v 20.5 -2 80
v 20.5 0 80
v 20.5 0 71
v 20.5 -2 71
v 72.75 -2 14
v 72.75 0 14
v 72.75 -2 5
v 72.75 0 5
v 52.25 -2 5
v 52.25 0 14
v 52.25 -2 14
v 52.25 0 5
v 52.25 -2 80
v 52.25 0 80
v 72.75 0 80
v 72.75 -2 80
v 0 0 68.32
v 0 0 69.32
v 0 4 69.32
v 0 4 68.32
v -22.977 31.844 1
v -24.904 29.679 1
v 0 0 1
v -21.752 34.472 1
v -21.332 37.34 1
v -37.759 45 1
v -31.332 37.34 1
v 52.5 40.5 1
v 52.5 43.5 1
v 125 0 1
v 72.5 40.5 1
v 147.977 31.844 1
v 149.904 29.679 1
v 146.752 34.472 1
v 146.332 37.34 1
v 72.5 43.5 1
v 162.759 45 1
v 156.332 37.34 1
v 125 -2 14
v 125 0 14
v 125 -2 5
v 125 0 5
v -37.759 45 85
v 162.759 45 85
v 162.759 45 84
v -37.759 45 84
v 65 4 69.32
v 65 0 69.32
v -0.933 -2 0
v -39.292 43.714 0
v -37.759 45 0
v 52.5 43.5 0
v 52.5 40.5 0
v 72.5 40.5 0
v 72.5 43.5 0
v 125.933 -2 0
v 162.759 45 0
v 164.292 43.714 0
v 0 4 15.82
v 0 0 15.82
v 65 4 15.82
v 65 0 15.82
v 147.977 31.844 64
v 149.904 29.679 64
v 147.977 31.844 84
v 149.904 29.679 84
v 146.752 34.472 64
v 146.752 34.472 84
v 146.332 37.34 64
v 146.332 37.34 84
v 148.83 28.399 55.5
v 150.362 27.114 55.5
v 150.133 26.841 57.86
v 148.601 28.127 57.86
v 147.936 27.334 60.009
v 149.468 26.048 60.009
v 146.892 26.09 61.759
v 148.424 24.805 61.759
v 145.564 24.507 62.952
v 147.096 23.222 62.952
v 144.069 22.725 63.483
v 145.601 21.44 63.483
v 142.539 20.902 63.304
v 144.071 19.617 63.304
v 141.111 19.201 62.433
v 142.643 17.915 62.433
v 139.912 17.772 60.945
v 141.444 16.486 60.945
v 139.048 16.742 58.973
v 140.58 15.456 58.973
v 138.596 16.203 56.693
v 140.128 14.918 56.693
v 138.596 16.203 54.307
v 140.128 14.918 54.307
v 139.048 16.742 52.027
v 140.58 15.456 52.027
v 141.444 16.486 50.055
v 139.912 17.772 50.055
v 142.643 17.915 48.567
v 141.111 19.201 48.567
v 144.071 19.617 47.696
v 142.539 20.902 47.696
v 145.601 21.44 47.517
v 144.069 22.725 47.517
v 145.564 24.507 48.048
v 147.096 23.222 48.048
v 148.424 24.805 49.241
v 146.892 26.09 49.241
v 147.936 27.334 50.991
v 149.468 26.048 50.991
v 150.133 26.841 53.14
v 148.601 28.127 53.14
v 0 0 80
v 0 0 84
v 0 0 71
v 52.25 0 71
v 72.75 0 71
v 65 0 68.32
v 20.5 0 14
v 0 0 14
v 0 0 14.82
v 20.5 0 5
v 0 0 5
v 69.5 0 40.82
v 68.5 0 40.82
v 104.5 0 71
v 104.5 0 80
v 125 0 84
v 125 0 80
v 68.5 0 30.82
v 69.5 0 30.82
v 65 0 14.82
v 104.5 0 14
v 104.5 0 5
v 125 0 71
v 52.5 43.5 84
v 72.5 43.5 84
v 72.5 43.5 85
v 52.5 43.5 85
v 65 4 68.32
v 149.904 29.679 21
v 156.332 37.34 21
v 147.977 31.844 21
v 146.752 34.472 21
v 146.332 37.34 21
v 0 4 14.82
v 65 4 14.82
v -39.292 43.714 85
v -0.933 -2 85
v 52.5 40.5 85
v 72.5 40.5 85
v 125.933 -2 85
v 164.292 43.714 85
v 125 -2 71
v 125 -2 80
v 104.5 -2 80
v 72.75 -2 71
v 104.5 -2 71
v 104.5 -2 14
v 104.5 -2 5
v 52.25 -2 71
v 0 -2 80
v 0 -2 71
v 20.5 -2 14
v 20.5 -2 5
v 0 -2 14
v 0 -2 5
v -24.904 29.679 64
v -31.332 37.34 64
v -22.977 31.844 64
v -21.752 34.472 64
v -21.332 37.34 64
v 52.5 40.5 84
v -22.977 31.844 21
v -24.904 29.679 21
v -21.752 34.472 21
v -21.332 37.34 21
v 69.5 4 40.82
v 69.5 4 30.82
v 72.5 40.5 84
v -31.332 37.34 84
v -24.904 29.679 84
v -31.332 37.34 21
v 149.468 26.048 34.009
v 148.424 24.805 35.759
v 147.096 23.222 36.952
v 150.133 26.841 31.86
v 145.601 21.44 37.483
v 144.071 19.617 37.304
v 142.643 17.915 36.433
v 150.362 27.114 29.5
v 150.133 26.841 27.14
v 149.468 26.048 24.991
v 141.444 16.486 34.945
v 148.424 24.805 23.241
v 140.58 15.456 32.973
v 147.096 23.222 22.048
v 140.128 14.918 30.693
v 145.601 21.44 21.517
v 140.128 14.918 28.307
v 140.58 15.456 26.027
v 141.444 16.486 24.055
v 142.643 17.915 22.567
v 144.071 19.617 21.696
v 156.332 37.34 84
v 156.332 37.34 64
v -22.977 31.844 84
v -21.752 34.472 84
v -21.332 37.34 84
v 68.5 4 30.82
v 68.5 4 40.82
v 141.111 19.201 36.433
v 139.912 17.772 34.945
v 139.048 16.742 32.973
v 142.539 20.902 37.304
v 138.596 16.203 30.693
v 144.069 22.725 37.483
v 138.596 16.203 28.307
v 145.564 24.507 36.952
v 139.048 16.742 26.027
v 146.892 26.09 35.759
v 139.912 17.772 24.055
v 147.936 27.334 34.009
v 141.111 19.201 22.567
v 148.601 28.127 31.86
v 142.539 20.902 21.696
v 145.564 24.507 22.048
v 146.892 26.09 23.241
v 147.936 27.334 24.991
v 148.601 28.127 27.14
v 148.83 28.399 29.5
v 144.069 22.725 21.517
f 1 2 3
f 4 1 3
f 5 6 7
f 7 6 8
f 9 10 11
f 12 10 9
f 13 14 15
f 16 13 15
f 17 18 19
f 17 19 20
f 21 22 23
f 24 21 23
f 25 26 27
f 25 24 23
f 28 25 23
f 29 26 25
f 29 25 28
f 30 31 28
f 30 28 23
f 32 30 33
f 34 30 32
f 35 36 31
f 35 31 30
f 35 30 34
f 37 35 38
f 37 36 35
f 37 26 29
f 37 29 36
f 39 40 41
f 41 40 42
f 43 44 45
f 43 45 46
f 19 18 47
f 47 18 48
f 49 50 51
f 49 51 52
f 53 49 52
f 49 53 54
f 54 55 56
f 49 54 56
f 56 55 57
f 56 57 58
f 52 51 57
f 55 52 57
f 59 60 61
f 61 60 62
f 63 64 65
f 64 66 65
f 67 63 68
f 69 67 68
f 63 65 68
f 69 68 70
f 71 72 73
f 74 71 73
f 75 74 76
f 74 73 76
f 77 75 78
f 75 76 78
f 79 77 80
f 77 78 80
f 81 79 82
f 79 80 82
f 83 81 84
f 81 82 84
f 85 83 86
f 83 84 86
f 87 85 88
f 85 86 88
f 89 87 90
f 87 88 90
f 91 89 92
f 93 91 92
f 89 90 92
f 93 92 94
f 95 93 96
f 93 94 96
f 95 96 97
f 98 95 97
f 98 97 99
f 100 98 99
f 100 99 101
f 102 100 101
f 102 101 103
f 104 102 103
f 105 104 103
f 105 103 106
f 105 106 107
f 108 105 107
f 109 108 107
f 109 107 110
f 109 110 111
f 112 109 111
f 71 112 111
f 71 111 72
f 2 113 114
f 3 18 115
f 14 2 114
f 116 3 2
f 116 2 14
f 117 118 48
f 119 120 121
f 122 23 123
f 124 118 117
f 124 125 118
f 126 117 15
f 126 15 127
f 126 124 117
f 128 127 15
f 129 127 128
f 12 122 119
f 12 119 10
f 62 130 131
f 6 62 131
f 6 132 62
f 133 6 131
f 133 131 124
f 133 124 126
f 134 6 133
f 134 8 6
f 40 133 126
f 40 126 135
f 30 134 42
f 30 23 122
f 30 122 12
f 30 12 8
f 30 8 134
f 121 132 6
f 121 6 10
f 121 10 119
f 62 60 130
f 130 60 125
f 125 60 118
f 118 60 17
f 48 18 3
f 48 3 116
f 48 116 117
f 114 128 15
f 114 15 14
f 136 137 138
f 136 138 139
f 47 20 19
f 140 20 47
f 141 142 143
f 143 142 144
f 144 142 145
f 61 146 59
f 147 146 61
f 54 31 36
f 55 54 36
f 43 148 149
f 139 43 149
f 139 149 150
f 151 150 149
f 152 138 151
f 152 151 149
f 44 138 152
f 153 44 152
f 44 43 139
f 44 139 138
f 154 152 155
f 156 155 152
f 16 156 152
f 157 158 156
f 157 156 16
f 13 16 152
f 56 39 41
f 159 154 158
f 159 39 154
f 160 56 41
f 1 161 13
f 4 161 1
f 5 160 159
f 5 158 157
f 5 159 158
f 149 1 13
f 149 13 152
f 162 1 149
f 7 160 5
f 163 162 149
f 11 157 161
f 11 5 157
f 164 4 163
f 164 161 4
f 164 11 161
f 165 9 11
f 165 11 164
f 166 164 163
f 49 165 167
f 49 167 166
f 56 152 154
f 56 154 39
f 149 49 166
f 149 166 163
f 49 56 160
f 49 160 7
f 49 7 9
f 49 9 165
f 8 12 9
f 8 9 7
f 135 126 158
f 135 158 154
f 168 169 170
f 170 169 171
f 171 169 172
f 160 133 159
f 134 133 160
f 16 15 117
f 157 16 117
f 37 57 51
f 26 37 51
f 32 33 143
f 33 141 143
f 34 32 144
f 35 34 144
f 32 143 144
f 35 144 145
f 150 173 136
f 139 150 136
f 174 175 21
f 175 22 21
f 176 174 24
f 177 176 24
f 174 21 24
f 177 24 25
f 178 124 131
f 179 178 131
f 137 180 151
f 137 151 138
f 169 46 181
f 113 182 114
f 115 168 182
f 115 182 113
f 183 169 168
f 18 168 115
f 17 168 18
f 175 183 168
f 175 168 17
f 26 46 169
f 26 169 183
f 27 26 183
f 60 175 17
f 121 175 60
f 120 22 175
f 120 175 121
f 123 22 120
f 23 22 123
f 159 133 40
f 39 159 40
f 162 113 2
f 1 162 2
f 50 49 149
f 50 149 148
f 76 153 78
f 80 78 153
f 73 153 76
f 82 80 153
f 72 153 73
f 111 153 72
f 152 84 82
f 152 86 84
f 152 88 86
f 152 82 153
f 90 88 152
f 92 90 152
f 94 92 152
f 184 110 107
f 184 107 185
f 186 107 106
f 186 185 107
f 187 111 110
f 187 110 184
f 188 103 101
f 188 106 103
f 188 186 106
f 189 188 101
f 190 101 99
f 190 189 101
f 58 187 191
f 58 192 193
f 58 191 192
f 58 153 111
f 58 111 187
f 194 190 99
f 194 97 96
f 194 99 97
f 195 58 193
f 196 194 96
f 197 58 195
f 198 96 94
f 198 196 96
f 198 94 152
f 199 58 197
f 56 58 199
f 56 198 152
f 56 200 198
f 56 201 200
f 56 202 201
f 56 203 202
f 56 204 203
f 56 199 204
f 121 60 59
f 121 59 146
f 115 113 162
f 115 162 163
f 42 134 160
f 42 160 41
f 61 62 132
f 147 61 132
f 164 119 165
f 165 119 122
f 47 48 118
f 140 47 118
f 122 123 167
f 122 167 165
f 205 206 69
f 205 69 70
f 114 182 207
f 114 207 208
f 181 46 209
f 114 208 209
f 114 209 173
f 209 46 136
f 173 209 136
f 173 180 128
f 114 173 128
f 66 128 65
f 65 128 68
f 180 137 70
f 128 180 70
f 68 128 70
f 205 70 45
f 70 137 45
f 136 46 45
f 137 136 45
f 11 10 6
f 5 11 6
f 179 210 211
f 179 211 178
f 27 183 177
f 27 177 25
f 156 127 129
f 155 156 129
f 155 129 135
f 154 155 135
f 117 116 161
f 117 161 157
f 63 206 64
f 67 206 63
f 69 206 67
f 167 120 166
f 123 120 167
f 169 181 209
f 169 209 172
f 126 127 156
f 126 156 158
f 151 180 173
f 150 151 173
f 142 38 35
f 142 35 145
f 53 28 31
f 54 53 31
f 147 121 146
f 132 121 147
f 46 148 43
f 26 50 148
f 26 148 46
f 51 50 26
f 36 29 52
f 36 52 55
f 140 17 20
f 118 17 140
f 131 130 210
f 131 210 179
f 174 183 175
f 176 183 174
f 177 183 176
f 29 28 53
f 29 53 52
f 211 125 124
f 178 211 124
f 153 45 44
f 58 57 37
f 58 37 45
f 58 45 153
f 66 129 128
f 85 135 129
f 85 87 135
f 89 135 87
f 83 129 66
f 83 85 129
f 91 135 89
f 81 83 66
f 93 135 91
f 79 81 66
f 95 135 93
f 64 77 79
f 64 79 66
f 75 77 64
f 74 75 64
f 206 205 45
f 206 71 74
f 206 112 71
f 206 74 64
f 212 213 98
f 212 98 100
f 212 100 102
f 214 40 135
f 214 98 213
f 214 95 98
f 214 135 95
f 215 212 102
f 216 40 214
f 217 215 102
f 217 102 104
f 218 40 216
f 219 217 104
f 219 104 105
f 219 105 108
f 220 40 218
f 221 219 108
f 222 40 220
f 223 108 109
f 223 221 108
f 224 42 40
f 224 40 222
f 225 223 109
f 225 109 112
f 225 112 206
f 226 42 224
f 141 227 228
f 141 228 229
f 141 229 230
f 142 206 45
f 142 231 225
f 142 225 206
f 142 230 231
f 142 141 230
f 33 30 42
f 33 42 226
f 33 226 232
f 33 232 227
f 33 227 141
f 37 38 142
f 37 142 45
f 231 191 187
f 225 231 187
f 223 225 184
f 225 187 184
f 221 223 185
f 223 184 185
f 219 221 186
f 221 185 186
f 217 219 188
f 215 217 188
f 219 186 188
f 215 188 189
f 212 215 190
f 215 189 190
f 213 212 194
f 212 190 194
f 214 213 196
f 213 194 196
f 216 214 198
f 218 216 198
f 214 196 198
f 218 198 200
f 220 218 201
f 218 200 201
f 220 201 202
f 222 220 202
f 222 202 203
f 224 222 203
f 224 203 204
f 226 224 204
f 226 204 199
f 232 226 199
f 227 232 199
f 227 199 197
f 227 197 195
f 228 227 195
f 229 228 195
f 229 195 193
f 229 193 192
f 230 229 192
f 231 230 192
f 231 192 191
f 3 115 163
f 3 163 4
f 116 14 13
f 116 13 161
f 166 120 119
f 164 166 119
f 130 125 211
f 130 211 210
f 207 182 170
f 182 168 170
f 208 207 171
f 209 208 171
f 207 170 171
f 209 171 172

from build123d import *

# Parameters (mm, degrees)
EXTRU_MINCE1_DEPTH      = 85
BOSS_EXTRU_1_DEPTH      = 1
BOSS_EXTRU_2_DEPTH      = 1
ESQUISSE7_W             = 20
ESQUISSE7_H             = 10
R_VOL_MINCE1_ANGLE      = 50
ESQUISSE8_W             = 20
ESQUISSE8_H             = 10
R_VOL_MINCE2_ANGLE      = 50
ESQUISSE9_W             = 20
ESQUISSE9_H             = 10
R_VOL_MINCE3_ANGLE      = 50
ESQUISSE10_W            = 20
ESQUISSE10_H            = 10
R_VOL_MINCE4_ANGLE      = 50
ESQUISSE12_W            = 20.5
ESQUISSE12_H            = 9
ENL_V_MAT_EXTRU_2_DEPTH = 10
ESQUISSE13_W            = 20.5
ESQUISSE13_H            = 9
ENL_V_MAT_EXTRU_3_DEPTH = 10
ESQUISSE14_W            = 65
ESQUISSE14_H            = 1
EXTRU_MINCE2_DEPTH      = 4
ESQUISSE15_W            = 1
ESQUISSE15_H            = 10
EXTRU_MINCE3_DEPTH      = 4
ESQUISSE16_W            = 20
ESQUISSE16_H            = 3
ENL_V_MAT_EXTRU_4_DEPTH = 10
ESQUISSE17_W            = 20
ESQUISSE17_H            = 3
ENL_V_MAT_EXTRU_5_DEPTH = 10
ESQUISSE19_R            = 8.005
ENL_V_MAT_EXTRU_6_DEPTH = 10


with BuildPart() as part:
    # Esquisse3 → Extru.-Mince1 (new body)
    with BuildSketch(Plane.XY):
        Polygon((-37.759483403, 45), (0, 0), (125, 0), (162.759483403, 45), (164.291572289, 43.714424781), (125.932615316, -2), (-0.932615316, -2), (-39.291572289, 43.714424781), align=None)
    extrude(amount=EXTRU_MINCE1_DEPTH)

    # Esquisse5 → Boss.-Extru.1 (add)
    with BuildSketch(Plane(origin=(0, 0, 0), x_dir=(-1, 0, 0), z_dir=(0, 0, -1))):
        Polygon((-162.759483403, 45), (37.759483403, 45), (0, 0), (-125, 0), align=None)
    extrude(amount=-BOSS_EXTRU_1_DEPTH)

    # Esquisse6 → Boss.-Extru.2 (add)
    with BuildSketch(Plane.XY.offset(85)):
        Polygon((162.759483403, 45), (-37.759483403, 45), (0, 0), (125, 0), align=None)
    extrude(amount=-BOSS_EXTRU_2_DEPTH)

    # Esquisse7 → Révol.-Mince1 (revolve)
    with BuildSketch(Plane(origin=(0, 0, 0), x_dir=(0, 0, -1), z_dir=(0.7660444431189791, 0.642787609686538, 0))):
        with Locations((-74, 43.74332802)):
            Rectangle(ESQUISSE7_W, ESQUISSE7_H)
    revolve(axis=Axis((-31.331607306, 37.339555569, 84), (0, 0, 1)), revolution_arc=R_VOL_MINCE1_ANGLE)

    # Esquisse8 → Révol.-Mince2 (revolve)
    with BuildSketch(Plane(origin=(0, 0, 0), x_dir=(0, 0, -1), z_dir=(0.7660444431189791, 0.642787609686538, 0))):
        with Locations((-11, 43.74332802)):
            Rectangle(ESQUISSE8_W, ESQUISSE8_H)
    revolve(axis=Axis((-31.331607306, 37.339555569, 1), (0, 0, 1)), revolution_arc=R_VOL_MINCE2_ANGLE)

    # Esquisse9 → Révol.-Mince3 (revolve)
    with BuildSketch(Plane(origin=(73.353011104, -61.550484563, 0), x_dir=(0, 0, 1), z_dir=(-0.7660444431189796, 0.6427876096865375, 0))):
        with Locations((74, 124.091779231)):
            Rectangle(ESQUISSE9_W, ESQUISSE9_H)
    revolve(axis=Axis((156.331607306, 37.339555569, 84), (0, 0, -1)), revolution_arc=R_VOL_MINCE3_ANGLE)

    # Esquisse10 → Révol.-Mince4 (revolve)
    with BuildSketch(Plane(origin=(73.353011104, -61.550484563, 0), x_dir=(0, 0, 1), z_dir=(-0.7660444431189796, 0.6427876096865375, 0))):
        with Locations((11, 124.091779231)):
            Rectangle(ESQUISSE10_W, ESQUISSE10_H)
    revolve(axis=Axis((156.331607306, 37.339555569, 1), (0, 0, -1)), revolution_arc=R_VOL_MINCE4_ANGLE)

    # Esquisse12 → Enlèv. mat.-Extru.2 (cut)
    with BuildSketch(Plane(origin=(0, 0, 0), x_dir=(1, 0, 0), z_dir=(0, 1, 0))):
        with Locations((10.25, -9.5)):
            Rectangle(ESQUISSE12_W, ESQUISSE12_H)
        with Locations((10.25, -75.5)):
            Rectangle(ESQUISSE12_W, ESQUISSE12_H)
        with Locations((114.75, -9.5)):
            Rectangle(ESQUISSE12_W, ESQUISSE12_H)
        with Locations((114.75, -75.5)):
            Rectangle(ESQUISSE12_W, ESQUISSE12_H)
    extrude(amount=-ENL_V_MAT_EXTRU_2_DEPTH, mode=Mode.SUBTRACT)

    # Esquisse13 → Enlèv. mat.-Extru.3 (cut)
    with BuildSketch(Plane(origin=(0, 0, 0), x_dir=(1, 0, 0), z_dir=(0, 1, 0))):
        with Locations((62.5, -9.5)):
            Rectangle(ESQUISSE13_W, ESQUISSE13_H)
        with Locations((62.5, -75.5)):
            Rectangle(ESQUISSE13_W, ESQUISSE13_H)
    extrude(amount=-ENL_V_MAT_EXTRU_3_DEPTH, mode=Mode.SUBTRACT)

    # Esquisse14 → Extru.-Mince2 (add)
    with BuildSketch(Plane(origin=(0, 0, 0), x_dir=(1, 0, 0), z_dir=(0, 1, 0))):
        with Locations((32.5, -15.319657918)):
            Rectangle(ESQUISSE14_W, ESQUISSE14_H)
        with Locations((32.5, -68.819657918)):
            Rectangle(ESQUISSE14_W, ESQUISSE14_H)
    extrude(amount=EXTRU_MINCE2_DEPTH)

    # Esquisse15 → Extru.-Mince3 (add)
    with BuildSketch(Plane(origin=(0, 0, 0), x_dir=(1, 0, 0), z_dir=(0, 1, 0))):
        with Locations((69, -35.819657918)):
            Rectangle(ESQUISSE15_W, ESQUISSE15_H)
    extrude(amount=EXTRU_MINCE3_DEPTH)

    # Esquisse16 → Enlèv. mat.-Extru.4 (cut)
    with BuildSketch(Plane.XY.offset(1)):
        with Locations((62.5, 42)):
            Rectangle(ESQUISSE16_W, ESQUISSE16_H)
    extrude(amount=-ENL_V_MAT_EXTRU_4_DEPTH, mode=Mode.SUBTRACT)

    # Esquisse17 → Enlèv. mat.-Extru.5 (cut)
    with BuildSketch(Plane(origin=(0, 0, 84), x_dir=(-1, 0, 0), z_dir=(0, 0, -1))):
        with Locations((-62.5, 42)):
            Rectangle(ESQUISSE17_W, ESQUISSE17_H)
    extrude(amount=-ENL_V_MAT_EXTRU_5_DEPTH, mode=Mode.SUBTRACT)

    # Esquisse19 → Enlèv. mat.-Extru.6 (cut)
    with BuildSketch(Plane(origin=(74.88509999, -62.836059783, 0), x_dir=(0, 0, -1), z_dir=(0.7660444431189799, -0.6427876096865373, 0))):
        with Locations(Location((-29.5, 109.415835895, 0), (0, 0, 90))):
            Circle(ESQUISSE19_R)
        with Locations(Location((-55.5, 109.415835895, 0), (0, 0, 90))):
            Circle(ESQUISSE19_R)
    extrude(amount=-ENL_V_MAT_EXTRU_6_DEPTH, mode=Mode.SUBTRACT)


solid = part.part
